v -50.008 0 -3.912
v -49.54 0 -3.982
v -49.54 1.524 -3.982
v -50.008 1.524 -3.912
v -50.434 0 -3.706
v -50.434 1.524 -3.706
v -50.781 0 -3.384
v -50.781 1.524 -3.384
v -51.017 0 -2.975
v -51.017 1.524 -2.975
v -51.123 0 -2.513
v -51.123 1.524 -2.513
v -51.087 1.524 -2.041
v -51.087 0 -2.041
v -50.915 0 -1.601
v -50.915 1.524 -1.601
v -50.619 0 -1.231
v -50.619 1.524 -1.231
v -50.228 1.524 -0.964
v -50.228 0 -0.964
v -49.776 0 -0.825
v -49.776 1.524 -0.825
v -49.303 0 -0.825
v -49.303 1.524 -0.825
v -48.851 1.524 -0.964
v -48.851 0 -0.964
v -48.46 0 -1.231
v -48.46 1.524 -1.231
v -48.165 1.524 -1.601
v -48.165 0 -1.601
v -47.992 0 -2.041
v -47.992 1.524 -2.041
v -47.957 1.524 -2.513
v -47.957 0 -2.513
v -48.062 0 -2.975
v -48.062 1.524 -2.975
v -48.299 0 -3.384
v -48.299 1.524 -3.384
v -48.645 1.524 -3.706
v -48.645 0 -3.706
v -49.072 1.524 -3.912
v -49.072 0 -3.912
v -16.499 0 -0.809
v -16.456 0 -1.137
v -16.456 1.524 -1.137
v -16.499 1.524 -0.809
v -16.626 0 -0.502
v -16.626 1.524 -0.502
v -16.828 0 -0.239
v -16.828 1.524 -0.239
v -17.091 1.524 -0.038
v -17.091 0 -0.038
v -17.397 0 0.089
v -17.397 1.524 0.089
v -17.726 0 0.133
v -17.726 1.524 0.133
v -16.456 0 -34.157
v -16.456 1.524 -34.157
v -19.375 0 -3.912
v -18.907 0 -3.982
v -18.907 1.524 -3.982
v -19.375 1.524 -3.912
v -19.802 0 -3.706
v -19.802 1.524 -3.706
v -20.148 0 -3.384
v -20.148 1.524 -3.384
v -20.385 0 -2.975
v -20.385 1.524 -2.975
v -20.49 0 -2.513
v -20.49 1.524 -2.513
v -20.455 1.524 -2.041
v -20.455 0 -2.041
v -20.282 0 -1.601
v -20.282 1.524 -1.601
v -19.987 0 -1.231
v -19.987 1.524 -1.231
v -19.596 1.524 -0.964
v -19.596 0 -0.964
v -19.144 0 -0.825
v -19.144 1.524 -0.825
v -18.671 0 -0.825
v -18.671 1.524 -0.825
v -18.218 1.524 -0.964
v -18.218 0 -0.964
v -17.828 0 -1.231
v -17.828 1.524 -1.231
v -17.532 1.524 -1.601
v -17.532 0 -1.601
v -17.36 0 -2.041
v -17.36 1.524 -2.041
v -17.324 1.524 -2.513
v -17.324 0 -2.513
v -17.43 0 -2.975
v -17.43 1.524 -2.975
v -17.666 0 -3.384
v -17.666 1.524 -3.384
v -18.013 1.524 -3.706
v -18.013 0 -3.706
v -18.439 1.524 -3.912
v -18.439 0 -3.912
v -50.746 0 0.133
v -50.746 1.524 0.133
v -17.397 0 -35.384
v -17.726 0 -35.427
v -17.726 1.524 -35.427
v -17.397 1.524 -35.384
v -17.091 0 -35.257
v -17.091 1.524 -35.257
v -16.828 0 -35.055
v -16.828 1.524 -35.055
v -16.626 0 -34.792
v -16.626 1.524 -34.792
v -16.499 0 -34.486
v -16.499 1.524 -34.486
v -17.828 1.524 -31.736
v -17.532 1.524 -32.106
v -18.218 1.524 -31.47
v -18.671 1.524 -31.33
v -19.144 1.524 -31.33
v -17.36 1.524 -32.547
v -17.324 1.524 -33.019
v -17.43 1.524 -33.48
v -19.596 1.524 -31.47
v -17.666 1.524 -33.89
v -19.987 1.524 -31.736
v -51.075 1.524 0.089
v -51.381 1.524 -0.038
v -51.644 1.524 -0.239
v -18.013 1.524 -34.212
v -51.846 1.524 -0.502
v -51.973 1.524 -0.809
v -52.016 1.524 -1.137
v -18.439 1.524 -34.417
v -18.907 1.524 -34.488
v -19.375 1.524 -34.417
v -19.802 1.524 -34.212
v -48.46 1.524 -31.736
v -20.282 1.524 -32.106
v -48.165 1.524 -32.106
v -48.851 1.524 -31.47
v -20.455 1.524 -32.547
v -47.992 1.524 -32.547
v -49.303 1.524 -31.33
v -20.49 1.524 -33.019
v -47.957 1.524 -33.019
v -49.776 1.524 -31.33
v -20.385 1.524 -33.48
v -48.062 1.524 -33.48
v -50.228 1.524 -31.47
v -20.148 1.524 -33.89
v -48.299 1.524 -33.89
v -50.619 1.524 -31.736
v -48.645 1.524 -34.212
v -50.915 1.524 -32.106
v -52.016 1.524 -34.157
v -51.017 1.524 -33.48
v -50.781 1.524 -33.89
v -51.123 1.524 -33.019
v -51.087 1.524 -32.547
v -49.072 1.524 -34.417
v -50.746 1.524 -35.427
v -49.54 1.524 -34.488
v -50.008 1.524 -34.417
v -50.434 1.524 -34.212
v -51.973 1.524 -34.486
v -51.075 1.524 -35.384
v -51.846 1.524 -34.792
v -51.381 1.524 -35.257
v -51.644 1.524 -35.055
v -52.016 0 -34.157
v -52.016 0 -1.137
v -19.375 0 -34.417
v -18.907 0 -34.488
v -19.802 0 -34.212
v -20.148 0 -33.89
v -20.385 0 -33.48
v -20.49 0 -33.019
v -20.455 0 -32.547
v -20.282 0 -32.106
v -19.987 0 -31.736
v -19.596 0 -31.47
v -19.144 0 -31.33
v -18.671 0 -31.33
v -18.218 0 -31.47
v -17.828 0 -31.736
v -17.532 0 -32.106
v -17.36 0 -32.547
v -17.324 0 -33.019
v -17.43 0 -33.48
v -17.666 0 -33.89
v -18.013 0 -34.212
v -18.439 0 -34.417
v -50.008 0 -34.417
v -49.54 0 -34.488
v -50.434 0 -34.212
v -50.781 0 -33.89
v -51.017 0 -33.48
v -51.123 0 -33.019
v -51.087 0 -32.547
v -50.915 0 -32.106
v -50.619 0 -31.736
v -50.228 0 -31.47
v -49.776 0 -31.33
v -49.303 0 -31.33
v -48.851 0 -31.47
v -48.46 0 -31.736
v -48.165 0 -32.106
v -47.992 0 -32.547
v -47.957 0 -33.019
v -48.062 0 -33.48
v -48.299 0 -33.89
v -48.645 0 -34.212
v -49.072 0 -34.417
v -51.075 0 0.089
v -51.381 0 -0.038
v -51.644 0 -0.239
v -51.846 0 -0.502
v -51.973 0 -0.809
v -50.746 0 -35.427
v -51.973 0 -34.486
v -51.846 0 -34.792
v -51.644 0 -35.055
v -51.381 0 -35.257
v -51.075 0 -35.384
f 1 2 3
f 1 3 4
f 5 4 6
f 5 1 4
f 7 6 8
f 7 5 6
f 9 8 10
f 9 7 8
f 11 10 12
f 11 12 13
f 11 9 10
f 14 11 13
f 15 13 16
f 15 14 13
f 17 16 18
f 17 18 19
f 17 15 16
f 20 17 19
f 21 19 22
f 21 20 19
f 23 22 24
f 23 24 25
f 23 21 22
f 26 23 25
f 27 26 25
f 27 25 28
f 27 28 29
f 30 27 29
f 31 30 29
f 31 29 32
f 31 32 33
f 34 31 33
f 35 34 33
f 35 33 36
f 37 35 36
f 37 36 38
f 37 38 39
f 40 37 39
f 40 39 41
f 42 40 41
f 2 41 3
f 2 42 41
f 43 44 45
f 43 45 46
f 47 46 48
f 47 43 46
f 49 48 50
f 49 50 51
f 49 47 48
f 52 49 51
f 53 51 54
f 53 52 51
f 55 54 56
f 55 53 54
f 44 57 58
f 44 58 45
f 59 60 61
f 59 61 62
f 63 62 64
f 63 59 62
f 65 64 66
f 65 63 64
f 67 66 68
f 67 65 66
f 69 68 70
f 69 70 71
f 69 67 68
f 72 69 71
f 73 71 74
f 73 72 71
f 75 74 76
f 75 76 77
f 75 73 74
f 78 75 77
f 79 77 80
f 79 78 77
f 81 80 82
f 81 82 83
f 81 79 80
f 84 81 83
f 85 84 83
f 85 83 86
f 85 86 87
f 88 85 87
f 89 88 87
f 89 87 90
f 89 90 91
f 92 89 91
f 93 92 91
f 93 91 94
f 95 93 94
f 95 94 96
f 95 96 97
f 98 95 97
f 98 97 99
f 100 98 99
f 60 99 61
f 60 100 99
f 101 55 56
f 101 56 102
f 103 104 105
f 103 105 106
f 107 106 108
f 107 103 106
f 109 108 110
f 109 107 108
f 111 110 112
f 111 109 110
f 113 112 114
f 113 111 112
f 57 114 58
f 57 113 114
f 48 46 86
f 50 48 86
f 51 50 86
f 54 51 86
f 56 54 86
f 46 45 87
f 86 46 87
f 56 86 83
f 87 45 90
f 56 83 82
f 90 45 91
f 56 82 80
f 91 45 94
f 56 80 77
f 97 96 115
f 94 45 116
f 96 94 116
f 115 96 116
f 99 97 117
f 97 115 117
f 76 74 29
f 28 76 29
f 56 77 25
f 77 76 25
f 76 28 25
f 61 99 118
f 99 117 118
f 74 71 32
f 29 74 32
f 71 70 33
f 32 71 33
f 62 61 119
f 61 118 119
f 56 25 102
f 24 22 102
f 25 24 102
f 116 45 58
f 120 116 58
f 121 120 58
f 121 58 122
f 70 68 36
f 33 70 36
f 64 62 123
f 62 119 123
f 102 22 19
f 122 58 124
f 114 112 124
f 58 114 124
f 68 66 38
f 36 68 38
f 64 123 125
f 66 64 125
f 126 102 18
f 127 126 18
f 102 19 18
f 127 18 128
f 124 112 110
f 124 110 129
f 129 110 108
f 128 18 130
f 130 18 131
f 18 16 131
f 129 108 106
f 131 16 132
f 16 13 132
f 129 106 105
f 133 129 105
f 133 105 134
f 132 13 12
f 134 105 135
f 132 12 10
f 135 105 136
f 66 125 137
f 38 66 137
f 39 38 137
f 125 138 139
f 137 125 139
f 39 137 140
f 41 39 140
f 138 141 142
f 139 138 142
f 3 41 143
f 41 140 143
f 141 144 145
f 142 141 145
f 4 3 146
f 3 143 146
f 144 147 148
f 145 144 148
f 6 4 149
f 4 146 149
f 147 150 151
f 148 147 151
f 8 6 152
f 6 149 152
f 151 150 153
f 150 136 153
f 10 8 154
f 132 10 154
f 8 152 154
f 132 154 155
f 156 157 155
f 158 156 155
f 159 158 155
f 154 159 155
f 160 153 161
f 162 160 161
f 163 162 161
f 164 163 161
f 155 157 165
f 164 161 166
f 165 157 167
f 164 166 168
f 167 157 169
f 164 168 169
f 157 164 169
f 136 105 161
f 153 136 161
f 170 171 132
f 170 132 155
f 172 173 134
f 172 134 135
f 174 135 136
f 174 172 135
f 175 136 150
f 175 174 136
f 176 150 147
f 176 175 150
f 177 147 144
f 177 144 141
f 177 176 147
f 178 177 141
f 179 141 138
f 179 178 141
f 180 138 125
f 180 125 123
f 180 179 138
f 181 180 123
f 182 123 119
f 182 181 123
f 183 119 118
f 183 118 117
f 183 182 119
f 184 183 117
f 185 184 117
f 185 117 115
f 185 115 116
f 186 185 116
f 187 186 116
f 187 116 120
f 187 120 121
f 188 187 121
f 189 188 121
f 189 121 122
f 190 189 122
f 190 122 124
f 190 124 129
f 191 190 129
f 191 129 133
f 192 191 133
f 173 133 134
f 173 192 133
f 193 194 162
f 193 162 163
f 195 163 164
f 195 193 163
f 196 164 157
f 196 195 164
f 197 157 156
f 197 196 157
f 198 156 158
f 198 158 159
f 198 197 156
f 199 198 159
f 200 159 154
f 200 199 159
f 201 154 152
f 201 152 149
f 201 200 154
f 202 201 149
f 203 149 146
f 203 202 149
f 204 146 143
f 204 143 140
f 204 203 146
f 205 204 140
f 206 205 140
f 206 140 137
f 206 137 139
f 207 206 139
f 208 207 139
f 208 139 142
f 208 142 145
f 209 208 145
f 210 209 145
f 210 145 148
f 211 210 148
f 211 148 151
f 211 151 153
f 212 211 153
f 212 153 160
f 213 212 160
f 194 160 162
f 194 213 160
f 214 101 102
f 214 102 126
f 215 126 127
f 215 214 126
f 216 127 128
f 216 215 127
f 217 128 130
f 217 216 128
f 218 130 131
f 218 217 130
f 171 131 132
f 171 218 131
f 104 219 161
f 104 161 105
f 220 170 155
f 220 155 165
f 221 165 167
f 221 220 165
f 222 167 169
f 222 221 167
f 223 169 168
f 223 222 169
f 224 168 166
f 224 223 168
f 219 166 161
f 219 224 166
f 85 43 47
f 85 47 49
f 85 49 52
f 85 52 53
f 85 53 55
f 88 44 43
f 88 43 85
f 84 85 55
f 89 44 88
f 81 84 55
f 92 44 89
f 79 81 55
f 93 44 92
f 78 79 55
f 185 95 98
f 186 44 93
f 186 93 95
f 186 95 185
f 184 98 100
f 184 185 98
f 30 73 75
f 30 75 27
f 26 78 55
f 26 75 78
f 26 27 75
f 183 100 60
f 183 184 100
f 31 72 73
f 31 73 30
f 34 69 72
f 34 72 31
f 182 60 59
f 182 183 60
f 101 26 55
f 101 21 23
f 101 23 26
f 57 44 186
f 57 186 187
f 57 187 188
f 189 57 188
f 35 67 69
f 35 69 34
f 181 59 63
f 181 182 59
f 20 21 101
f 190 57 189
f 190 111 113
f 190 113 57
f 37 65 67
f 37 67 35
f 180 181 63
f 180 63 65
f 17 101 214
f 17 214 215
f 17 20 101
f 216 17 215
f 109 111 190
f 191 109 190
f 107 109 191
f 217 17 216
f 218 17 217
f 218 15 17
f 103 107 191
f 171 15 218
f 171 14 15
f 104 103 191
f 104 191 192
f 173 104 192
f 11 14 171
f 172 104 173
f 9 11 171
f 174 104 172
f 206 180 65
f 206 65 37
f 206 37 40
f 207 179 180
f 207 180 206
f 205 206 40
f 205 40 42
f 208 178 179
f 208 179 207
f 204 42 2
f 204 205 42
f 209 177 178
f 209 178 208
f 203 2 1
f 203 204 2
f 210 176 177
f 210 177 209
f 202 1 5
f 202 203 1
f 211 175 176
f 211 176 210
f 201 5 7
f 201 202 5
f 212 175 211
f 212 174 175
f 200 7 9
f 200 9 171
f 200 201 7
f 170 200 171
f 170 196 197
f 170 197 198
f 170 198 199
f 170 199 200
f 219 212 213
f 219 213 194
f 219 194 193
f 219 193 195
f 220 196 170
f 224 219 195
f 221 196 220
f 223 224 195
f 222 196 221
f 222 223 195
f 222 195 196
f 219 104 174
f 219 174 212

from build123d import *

# Parameters (mm, degrees)
SKETCH1_R           = 1.5875
BOSS_EXTRUDE2_DEPTH = 1.524


with BuildPart() as part:
    # Sketch1 → Boss-Extrude2 (new body)
    with BuildSketch(Plane(origin=(0, 0, 0), x_dir=(1, 0, 0), z_dir=(0, 1, 0))):
        with BuildLine():
            Line((-50.746188486, 35.427401309), (-17.726188486, 35.427401309))
            ThreePointArc((-17.726188486, 35.427401309), (-16.828162874, 35.055426921), (-16.456188486, 34.157401309))
            Line((-16.456188486, 34.157401309), (-16.456188486, 27.108901309))
            Line((-16.456188486, 27.108901309), (-16.456188486, 8.185901309))
            Line((-16.456188486, 8.185901309), (-16.456188486, 1.137401309))
            ThreePointArc((-16.456188486, 1.137401309), (-16.828162874, 0.239375697), (-17.726188486, -0.132598691))
            Line((-17.726188486, -0.132598691), (-50.746188486, -0.132598691))
            ThreePointArc((-50.746188486, -0.132598691), (-51.644214098, 0.239375697), (-52.016188486, 1.137401309))
            Line((-52.016188486, 1.137401309), (-52.016188486, 34.157401309))
            ThreePointArc((-52.016188486, 34.157401309), (-51.644214098, 35.055426921), (-50.746188486, 35.427401309))
        make_face()
        with Locations(Location((-49.539688486, 32.900101309, 0), (0, 0, 90))):
            Circle(SKETCH1_R, mode=Mode.SUBTRACT)
        with Locations(Location((-18.907288486, 32.900101309, 0), (0, 0, 90))):
            Circle(SKETCH1_R, mode=Mode.SUBTRACT)
        with Locations(Location((-18.907288486, 2.394701309, 0), (0, 0, 90))):
            Circle(SKETCH1_R, mode=Mode.SUBTRACT)
        with Locations(Location((-49.539688486, 2.394701309, 0), (0, 0, 90))):
            Circle(SKETCH1_R, mode=Mode.SUBTRACT)
    extrude(amount=BOSS_EXTRUDE2_DEPTH)


solid = part.part
